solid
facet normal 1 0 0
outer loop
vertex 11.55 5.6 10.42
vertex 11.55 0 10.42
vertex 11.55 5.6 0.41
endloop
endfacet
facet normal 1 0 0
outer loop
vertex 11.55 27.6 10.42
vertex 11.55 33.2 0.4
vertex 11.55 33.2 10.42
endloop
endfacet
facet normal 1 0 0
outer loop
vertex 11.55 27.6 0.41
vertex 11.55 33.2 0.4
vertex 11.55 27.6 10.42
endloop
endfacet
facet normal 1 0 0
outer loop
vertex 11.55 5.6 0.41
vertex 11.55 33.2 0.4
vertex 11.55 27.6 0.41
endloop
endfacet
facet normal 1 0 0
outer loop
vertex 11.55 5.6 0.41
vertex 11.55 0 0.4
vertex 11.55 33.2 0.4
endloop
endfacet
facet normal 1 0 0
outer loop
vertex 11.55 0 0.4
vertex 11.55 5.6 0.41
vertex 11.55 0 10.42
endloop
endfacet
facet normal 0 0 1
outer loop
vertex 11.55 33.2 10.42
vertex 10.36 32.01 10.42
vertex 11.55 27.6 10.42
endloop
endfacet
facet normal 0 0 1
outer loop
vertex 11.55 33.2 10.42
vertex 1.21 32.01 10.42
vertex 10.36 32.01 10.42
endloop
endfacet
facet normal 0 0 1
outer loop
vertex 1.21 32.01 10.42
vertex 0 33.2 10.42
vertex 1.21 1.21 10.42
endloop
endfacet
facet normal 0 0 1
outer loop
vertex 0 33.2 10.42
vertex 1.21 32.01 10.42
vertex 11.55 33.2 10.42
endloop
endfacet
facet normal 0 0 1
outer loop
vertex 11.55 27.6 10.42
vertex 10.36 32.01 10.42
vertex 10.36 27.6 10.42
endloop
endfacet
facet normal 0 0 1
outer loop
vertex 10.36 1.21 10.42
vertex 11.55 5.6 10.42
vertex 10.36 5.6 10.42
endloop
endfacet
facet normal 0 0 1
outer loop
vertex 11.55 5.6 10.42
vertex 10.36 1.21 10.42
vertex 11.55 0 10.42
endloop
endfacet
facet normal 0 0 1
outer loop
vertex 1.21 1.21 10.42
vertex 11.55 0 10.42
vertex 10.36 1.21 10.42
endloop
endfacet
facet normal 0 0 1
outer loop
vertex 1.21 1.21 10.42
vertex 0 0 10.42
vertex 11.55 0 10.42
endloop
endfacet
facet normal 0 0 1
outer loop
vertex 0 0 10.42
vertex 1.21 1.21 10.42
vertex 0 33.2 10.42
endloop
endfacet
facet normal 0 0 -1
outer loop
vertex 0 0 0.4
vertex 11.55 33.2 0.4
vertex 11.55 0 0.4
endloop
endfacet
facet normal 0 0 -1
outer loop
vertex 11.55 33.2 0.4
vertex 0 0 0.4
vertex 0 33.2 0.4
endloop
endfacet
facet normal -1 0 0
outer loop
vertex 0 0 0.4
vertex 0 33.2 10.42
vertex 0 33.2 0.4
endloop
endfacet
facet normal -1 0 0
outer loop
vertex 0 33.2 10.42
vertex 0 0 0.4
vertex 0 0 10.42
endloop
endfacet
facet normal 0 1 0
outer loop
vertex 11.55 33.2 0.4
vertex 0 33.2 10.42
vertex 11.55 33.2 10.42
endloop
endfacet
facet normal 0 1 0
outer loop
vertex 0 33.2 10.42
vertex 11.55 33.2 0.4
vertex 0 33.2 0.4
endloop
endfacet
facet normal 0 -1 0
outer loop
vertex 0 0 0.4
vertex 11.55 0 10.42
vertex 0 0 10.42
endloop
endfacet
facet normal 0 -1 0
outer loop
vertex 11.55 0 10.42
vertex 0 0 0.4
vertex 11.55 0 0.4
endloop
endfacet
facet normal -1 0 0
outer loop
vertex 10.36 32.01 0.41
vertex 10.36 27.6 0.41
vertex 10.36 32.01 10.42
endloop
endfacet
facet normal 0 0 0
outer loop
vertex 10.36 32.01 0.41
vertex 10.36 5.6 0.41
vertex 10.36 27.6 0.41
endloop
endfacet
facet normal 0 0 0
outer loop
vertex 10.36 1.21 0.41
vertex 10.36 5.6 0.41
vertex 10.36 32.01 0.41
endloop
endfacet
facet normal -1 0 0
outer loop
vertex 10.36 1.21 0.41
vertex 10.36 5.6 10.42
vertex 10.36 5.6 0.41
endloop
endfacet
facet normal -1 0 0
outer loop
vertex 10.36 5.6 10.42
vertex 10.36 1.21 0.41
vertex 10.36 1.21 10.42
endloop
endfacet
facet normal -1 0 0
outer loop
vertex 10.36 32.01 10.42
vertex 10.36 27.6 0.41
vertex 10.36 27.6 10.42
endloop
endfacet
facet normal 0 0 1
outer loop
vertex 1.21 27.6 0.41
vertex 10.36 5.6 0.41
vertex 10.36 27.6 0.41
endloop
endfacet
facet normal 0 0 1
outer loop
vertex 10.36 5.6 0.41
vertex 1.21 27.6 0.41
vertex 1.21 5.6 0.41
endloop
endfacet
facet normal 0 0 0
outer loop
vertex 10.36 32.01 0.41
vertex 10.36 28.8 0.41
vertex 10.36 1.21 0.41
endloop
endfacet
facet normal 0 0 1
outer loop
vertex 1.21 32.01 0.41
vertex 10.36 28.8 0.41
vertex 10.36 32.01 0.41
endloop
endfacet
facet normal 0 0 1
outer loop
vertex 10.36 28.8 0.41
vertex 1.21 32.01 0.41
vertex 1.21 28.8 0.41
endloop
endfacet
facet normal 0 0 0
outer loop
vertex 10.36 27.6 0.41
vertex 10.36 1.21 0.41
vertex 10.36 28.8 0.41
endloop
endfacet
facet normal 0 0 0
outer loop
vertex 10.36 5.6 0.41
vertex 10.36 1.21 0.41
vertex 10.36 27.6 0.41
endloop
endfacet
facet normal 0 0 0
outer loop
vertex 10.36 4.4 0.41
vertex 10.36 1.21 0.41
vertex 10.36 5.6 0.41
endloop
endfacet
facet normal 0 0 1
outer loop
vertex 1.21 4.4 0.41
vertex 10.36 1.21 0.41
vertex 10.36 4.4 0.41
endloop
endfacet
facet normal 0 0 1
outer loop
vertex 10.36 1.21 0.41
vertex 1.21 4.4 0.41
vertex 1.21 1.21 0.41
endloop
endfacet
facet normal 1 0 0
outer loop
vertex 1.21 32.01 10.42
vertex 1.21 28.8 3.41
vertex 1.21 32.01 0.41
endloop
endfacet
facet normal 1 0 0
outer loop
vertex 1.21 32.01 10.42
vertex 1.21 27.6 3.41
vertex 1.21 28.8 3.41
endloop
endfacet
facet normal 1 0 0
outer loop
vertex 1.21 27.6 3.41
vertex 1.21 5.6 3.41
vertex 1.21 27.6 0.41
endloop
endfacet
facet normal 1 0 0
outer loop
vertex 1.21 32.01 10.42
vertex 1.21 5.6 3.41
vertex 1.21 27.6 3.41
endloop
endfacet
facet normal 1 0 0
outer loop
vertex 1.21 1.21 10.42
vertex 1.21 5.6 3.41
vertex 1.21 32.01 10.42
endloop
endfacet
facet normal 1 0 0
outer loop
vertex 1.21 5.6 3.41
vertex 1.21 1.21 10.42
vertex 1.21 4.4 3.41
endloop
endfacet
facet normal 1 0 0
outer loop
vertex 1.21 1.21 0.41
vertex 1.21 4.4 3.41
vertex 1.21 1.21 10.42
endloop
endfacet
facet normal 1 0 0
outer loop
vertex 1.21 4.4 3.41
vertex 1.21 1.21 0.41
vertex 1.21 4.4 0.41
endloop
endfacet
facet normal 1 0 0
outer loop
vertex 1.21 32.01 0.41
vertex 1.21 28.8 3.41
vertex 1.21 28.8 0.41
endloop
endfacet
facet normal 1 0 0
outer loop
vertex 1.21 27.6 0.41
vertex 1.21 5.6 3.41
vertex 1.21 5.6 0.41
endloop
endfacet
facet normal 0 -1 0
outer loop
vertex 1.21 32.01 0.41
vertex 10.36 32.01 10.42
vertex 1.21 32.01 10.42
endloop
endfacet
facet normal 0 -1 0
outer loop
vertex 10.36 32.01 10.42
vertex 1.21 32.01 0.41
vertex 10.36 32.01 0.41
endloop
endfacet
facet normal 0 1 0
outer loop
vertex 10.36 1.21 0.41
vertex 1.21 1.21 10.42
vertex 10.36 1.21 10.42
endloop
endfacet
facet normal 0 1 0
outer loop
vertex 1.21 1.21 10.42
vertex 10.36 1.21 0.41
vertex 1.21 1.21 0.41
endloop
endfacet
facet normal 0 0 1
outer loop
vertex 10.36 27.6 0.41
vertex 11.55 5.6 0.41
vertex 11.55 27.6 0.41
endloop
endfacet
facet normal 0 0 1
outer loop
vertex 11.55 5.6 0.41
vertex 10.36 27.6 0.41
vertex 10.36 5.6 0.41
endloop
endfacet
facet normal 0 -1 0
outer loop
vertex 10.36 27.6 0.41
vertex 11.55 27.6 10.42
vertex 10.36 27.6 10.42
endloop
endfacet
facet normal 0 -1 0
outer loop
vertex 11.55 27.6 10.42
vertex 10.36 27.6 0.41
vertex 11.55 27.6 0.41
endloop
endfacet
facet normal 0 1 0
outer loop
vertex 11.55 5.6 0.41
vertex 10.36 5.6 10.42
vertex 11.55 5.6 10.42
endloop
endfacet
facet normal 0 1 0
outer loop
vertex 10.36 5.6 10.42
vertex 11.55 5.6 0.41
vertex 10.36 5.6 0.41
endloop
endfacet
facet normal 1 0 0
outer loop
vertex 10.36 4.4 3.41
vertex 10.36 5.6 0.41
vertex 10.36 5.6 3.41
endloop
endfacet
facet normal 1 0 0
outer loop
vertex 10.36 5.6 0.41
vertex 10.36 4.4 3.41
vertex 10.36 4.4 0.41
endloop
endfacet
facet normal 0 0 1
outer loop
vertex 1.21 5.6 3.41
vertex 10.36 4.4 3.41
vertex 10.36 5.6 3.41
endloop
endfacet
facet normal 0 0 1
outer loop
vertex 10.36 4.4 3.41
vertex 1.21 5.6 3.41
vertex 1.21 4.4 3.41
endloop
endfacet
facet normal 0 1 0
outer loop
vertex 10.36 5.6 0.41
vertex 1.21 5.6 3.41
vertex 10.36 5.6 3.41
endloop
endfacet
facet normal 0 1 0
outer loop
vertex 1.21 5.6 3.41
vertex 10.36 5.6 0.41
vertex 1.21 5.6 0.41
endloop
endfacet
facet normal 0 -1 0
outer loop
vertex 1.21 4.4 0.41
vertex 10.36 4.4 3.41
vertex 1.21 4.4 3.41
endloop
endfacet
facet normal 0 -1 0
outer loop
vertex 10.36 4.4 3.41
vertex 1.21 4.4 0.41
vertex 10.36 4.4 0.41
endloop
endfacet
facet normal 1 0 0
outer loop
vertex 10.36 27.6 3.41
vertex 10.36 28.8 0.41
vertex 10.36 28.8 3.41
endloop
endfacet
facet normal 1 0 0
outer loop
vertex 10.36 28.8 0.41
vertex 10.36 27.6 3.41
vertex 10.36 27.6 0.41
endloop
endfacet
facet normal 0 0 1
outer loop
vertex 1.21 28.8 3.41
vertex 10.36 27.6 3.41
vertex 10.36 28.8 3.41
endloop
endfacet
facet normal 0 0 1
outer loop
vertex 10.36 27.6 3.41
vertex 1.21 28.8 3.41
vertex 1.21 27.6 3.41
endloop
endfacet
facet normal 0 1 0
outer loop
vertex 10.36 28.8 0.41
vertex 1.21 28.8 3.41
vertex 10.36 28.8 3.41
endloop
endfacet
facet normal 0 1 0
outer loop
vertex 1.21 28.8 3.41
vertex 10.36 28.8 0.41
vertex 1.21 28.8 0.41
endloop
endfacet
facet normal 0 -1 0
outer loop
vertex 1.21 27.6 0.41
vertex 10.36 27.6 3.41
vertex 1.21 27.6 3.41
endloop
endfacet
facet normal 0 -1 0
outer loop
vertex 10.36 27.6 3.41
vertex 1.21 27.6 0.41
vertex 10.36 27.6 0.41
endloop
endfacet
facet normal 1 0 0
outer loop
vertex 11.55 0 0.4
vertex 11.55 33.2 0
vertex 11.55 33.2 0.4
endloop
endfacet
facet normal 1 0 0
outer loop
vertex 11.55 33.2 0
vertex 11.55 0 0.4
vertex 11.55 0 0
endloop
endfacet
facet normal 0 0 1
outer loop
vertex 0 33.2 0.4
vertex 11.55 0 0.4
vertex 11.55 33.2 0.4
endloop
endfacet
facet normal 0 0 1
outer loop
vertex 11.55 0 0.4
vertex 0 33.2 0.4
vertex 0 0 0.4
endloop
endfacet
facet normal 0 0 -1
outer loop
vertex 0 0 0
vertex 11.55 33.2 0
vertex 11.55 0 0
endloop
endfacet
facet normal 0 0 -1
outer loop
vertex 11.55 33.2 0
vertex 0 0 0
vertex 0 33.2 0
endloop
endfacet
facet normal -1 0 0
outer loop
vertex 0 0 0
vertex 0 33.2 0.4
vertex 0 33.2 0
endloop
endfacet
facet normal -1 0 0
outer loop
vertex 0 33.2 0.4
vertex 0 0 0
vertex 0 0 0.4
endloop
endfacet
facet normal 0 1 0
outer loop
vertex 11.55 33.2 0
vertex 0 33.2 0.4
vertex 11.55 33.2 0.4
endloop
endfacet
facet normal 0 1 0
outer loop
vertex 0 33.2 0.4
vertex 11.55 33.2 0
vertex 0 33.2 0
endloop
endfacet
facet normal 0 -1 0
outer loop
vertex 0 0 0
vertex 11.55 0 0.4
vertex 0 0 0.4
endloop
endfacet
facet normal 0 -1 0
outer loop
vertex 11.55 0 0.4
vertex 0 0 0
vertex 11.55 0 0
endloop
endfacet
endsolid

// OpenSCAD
// file: ../../Base/Rotation.scad
// Fischertechnik Box Foundation
// Geometry Helpers Rotation

include <PlacementOptions.scad>

// getRotatedSpace(space, rotation=NoRotation)
// Rotates the space dependent on the specified rotation

function getRotatedSpace(space, rotation=NoRotation) = [
    (rotation == Rotate90 || rotation == Rotate270) ? space.y : space.x,
    (rotation == Rotate90 || rotation == Rotate270) ? space.x : space.y
];

// Rotates the given space around the fixed left lower corner
// space = the space the children needs as width/depth list [width,depth]
// rotation = 0 Rotate0 degrees, 1 Rotate90 degrees, 2 Rotate180 degrees, 3 Rotate270 degrees (equivalent to -90)

module RotateFix(space, rotation=NoRotation) {
    dy = (rotation == Rotate0 || rotation == Rotate270) ? 0 :
        (rotation == Rotate90) ? space.x :
        space.y;
    dx = (rotation < Rotate180) ? 0 :
        (rotation == Rotate180) ? space.x :
        space.y;
    
    translate([dx, dy, 0])
        rotate([0, 0, rotations[rotation]])
            children();
}
// file: ../../Base/Alignment.scad
// Fischertechnik Box Foundation
// Geometry Helpers Alignment

include <PlacementOptions.scad>

// getAlignedX(elementWidth, spaceWidth, align=AlignRight, offset=0)
// Gets the aligned X offset of an element with the given
// width in the given space.
// elementWidth = The width of the element to positon
// spaceWidth = The space where the element should be aligned
// align = 0 AlignLeft, 1 AlignCenter, 2 AlignRight
// offset = an optional offset from the aligned position. When
// aligned left or centered, then positive values are in X direction.
// When aligned right then positive values are in negative X direction.

function getAlignedX(elementWidth, spaceWidth, align=AlignRight, offset=0) =
    (align == AlignLeft) ?
        offset :
        ((align == AlignCenter) ?
        (spaceWidth - elementWidth)/2 + offset :
        spaceWidth - offset - elementWidth);

// getAlignedY(elementDepth, spaceDepth, align=AlignTop, offset=0)
// Gets the aligned Y offset of an element with the given
// depth in the given space.
// elementDepth = The depth of the element to positon
// spaceDepth = The space where the element should be aligned
// align = 0 AlignBottom, 1 AlignCenter, 2 AlignTop
// offset = an optional offset from the aligned position. When
// aligned bottom or centered, then positive values are in Y direction.
// When aligned top then positive values are in negative Y direction.

function getAlignedY(elementDepth, spaceDepth, align=AlignTop, offset=0) =
    (align == AlignBottom) ?
        offset :
        ((align == AlignCenter) ?
        (spaceDepth - elementDepth)/2 + offset :
        spaceDepth - offset - elementDepth);
// file: ../../Base/PlacementOptions.scad
// Fischertechnik Box Foundation
// Placement Options

// Alignment
NoAlign = 0;
AlignLeft = 1;
AlignBottom = 2;
AlignCenter = 3;
AlignRight = 4;
AlignTop = 5;

// Element rotation degree steps
rotations = [0, -90, -180, -270];

// Rotation
NoRotation = 0;
Rotate0 = 0;
Rotate90 = 1;
Rotate180 = 2;
Rotate270 = 3;

// Docking (seen from above)
NoDock = -1;
DockLeft = 0;
DockTop = 1;
DockRight = 2;
DockCorner = 2;
DockBottom = 3;

// Web corners
LowerLeft = 0;
UpperLeft = 1;
UpperRight = 2;
LowerRight = 3;

// Web position relative to corner
LeftOfCorner = 0;
RightOfCorner = 1;
// file: ../../Base/Boxes.scad
// Fischertechnik Box Foundation
// Pre-designed Boxes

use <Constants.scad>

include <PlacementOptions.scad>

box190Width = 190;
box190Depth = 130;
box130Width = 130;
box130Depth = 95;

// Values are from an original ec3 box
topBottomDifference = 1.5;
outerHeight = 40;
innerHeight = 38.2;
baseThickness = outerHeight - innerHeight;
stackExcess = 5.7;
radius = 3.5;
wallThickness = 1.5;
tolerance = 0.2;
stackOffset = innerHeight - stackExcess;

boxUsageHeight = stackOffset;
boxWallThickness = wallThickness;
boxBaseThickness = baseThickness;
boxWebWidth = 3.0;

// getBoxWallThickness()
// Gets the wall thickness of a Fischertechnik Box
function getBoxWallThickness() = boxWallThickness;

// getBoxUsageHeight()
// Gets the usable height of a Fischertechnik box
function getBoxUsageHeight() = boxUsageHeight;

// getBoxInnerHeight()
// Gets the inner height of a Fischertechnik box, including the stack excess
function getBoxInnerHeight() = innerHeight;

// getBoxBaseThickness()
// Gets the thickness of the Fischertechnik box base.
function getBoxBaseThickness() = boxBaseThickness;

// getBoxWebWidth()
// Gets the width of a box web
function getBoxWebWidth() = boxWebWidth;

// getBox190Space()
// Gets the usable inner space of a Box 190 as an x/y-list
function getBox190Space() = [
    box190Width - 2*getBoxWallThickness() - topBottomDifference, 
    box190Depth - 2*getBoxWallThickness() - topBottomDifference ];

// BoxBase(width, depth)
// Creates an empty stackable Fischertechnik compatible box
// width = Outer width of the box (190, 130, ...)
// depth = Outer depth of the box (130, 95, ...)

module BoxBase(width, depth, height=outerHeight) {    
    thinPlate = 0.01;

    innerHeight = height - baseThickness;    
    
    module BodyPlate(width, depth) {
        translate([radius, radius])
        hull() {
            w = width-2*radius;
            d = depth-2*radius;
            cube([w, d, thinPlate]);
            cylinder(thinPlate, r=radius, $fn=getFragments());
            translate([w, 0])
                cylinder(thinPlate, r=radius, $fn=getFragments());
            translate([w, d])
                cylinder(thinPlate, r=radius, $fn=getFragments());
            translate([0, d])
                cylinder(thinPlate, r=radius, $fn=getFragments());
        }
    }
    
    module Body(tolerance=tolerance) {
        hull() {
            // Bottom with tolerance to fit into the original boxes when stacked
            translate([-wallThickness+tolerance, -wallThickness+tolerance, -baseThickness])
                BodyPlate(width-topBottomDifference-2*tolerance, depth-topBottomDifference-2*tolerance);
            
            // Top
            translate([-wallThickness-topBottomDifference/2, -wallThickness-topBottomDifference/2, innerHeight-thinPlate])
                BodyPlate(width, depth);
         }
    }

    module Cutoff() {
        hull() {
            coWidth = width - 2*wallThickness;
            coDepth = depth - 2*wallThickness;
            
            // Bottom
            BodyPlate(coWidth-topBottomDifference, coDepth-topBottomDifference);

            // Top
            translate([-topBottomDifference/2, -topBottomDifference/2, innerHeight+thinPlate]) 
                BodyPlate(coWidth, coDepth);
        }
    }
    
    difference() {        
        Body();
        Cutoff();
        stackOffset = innerHeight - stackExcess;
        translate([0, 0, stackOffset + baseThickness])
            Body(tolerance=0);
    }
}

// Creates the Fischertechnik empty box 130x190 mm and places it at position 0,0
// 190x130 are the outer sizes, the inner space is slightly smaller. Use getBox190Space() to get the inner sizes.
// The box is positioned that the usable inner space is at the 0,0,0 position. The

module Box190() {
    BoxBase(box190Width, box190Depth);
}

// Gets the usable inner space of a Box 130 as an x/y-list
function getBox130Space() = [
    box130Width - 2*getBoxWallThickness() - topBottomDifference, 
    box130Depth - 2*getBoxWallThickness() - topBottomDifference ];

// Creates the Fischertechnik empty box 95x130 mm and places it at position 0,0
// 190x130 are the outer sizes, the inner space is slightly smaller. Use getBox190Space() to get the inner sizes.
// The box is positioned that the usable inner space is at the 0,0,0 position. The

module Box130() {
    BoxBase(box130Width, box130Depth);
}

// Creates a web at the specified box walls
// corner 0 = LowerLeft, 1 = UpperLeft, 2 = UpperRight, 3 = LowerRight
// side 0 = LeftOfCorner, 1 = RightOfCorner
// distance = Distance in mm from the corner
// boxSpace = inner width and depth of the box (default: Box 190)
// webWidth = length of the web (default is 3 mms)
// webThickness = thickness of the web (default is 1 mm)

module BoxWeb(corner, side, distance, boxSpace=getBox190Space(), webWidth=getBoxWebWidth(), webThickness=1.0) {
    sink = getBoxWallThickness()/2;

    width = (corner % 2 == 0) ? 
            (side == LeftOfCorner ? webWidth : webThickness) :
            (side == LeftOfCorner ? webThickness : webWidth);

    depth = (corner % 2 == 0) ? 
            (side == RightOfCorner ? webWidth : webThickness) :
            (side == RightOfCorner ? webThickness : webWidth);
    
    xDiff = corner == LowerLeft ? 
                (side == LeftOfCorner ? -sink : distance) :
            (corner == UpperLeft ?                
                (side == LeftOfCorner ? distance : -sink) :
            (corner == UpperRight ?
                (side == LeftOfCorner ? boxSpace.x-webWidth+sink : boxSpace.x-distance-webThickness) :
                (side == LeftOfCorner ? boxSpace.x-distance-webThickness: boxSpace.x-webWidth+sink)));

    yDiff = corner == LowerLeft ? 
                (side == RightOfCorner ? -sink : distance) :
            (corner == UpperLeft ?
                (side == RightOfCorner ? boxSpace.y-distance : boxSpace.y-webWidth+sink) :
            (corner == UpperRight ?
                (side == RightOfCorner ? boxSpace.y-webWidth+sink : boxSpace.y-distance) :
                (side == RightOfCorner ? distance : -sink)));
    
    translate([xDiff, yDiff, -getExcess()])
        cube([width, depth, boxUsageHeight + 2*getExcess()]);
}
// file: ../../Base/Placement.scad
// Fischertechnik Box Foundation
// Geometry Helpers Placement

use <Constants.scad>
use <Alignment.scad>
use <Rotation.scad>
use <Boxes.scad>

include <PlacementOptions.scad>

// Place(x=0, y=0, elementSpace=[0,0], alignX=AlignLeft, alignY=AlignBottom, rotation=Rotate0, boxSpace=getBox190Space())
// Places the child at the specified position
// y = Y-Position. This is a relative position when an X aligment is specified.
// x = X-Position. This is a relative position when an Y aligment is specified.
// elementSpace = space of the element to be placed [x,y]
// alignX = -1=NoAlign, 0 AlignLeft, 1 AlignCenter, 3 AlignRight (elementSpace and boxSpace required!)
// alignY = -1=NoAlign, 2 AlignBottom, 1 AlignCenter, 4 AlignTop (elementSpace and boxSpace required!)
// rotation = 0 Rotate0 0 degrees, 1 Rotate90 90 degrees, 
// 2 Rotate180 180 degrees, 3 Rotate270 270 degrees (equivalent to -90)
// boxSpace = Inner space of the box where the placement occurs [x,y] - default is Box 190x130 inner space

module Place(x=0, y=0, elementSpace=[0,0], 
  alignX=AlignLeft, alignY=AlignBottom, 
  rotation=NoRotation, boxSpace=getBox190Space()) {

    module Position(x, y, space, rotation=Rotate0) {
        translate([x, y, 0])
            RotateFix(space, rotation)
                children();
    }

    space = getRotatedSpace(elementSpace, rotation);
    alignedX = getAlignedX(space.x, boxSpace.x, alignX, x);
    alignedY = getAlignedY(space.y, boxSpace.y, alignY, y);
    Position(alignedX, alignedY, elementSpace, rotation)
        children();
}

// Center(space=getBox130Space(), elementSpace=[0,0])
// space = Space where the children is centered. For cylinder use centered=true and no elementSpace.
// elementSpace = space of the element to be centered [x,y]

module Center(space=getBox190Space(), elementSpace=[0,0]) {
    Place(elementSpace=elementSpace, boxSpace=space, alignX=AlignCenter, alignY=AlignCenter)
        children();
}

// CenterHorizontal(width=0, y=0, offset=0, space=getBox130Space())
// width = Width of the element to be placed.
// y = Y position of the element
// offset = Offset from the center position (negative will be left of the center)
// space = Space where the element is placed

module CenterHorizontal(width=0, y=0, offset=0, space=getBox190Space()) {
    Place(x=offset, y=y, elementSpace=[width, 0], boxSpace=space, alignX=AlignCenter)
        children(0);
}

// CenterVertical(depth=0, x=0, offset=0, space=getBox130Space())
// depth = Depth of the element to be placed.
// x = X position of the element
// offset = Offset from the center position (negative will be down of the center)
// space = Space where the element is placed

module CenterVertical(depth=0, x=0, offset=0, space=getBox190Space()) {
    Place(x=x, y=offset, elementSpace=[0, depth], boxSpace=space, alignY=AlignCenter)
        children(0);
}

// getIsVertical(align)
// True if the specified alignment needs a vertical orientation for a divider (AlignRight, AlignLeft)

function getIsVertical(align) = (align == AlignRight || align == AlignLeft);

// getIsHorizontal(align)
// True if the specified alignment needs a horizontal orientation for a divider (AlignTop, AlignBottom)

function getIsHorizontal(align) = (align == AlignTop || align == AlignBottom);
// file: ../../Elements/AxisClip10.scad
// Fischertechnik Box Library
// Axis for clip 10
// 31023

use <../ModelBase/Simple.scad>
use <../Base/Constants.scad>

width = 12;
depth = 12;
height = 23;
upperDiameter = 3.6;
clipHeight = 10;

// getAxisClip10Space()
// Gets the space of a frame for a clip 10 with spring ring (mot2)

function getAxisClip10Space() = [width, depth, height];

// AxisClip10(height, clipHeight)
// Axis for clip 10 with spring ring (mot2)
// height = Height of the complete axis
// clipHeight = Height of the rt for the clip (standard is 10, in mot3 its only 7)

module AxisClip10(height=height, clipHeight=clipHeight) {
    LeveledAxisWithSpace(height, height-clipHeight, getAxisClip10Space(), diameter=upperDiameter);
}

// Tests
color("lightgray")
AxisClip10();
// file: ../../Base/Constants.scad
// Fischertechnik Box Foundation
// Constants

// Constant values necessary for multiple elements

// Base constants
dividerThickness = 1.2;
excess = 0.01;
fragments = 90;
tolerance = 0.8;

// Gets the thickness of a divider 
function getDividerThickness() = dividerThickness;

// Gets the excess that is used to merge walls into each other
function getExcess() = excess;

// Gets amount of fragments of a cylinder
function getFragments() = fragments;

// Gets the inner tolerance of a frame to each side
function getTolerance() = tolerance;


// Fischertechnik specific constants
axisDiameter = 4;
axisBottomDiameter = axisDiameter + 1;
standardEdgeDistance = 2.5;
standardWebDistance = 11.5;
standardCornerLength = 15;
tubeWallFactor = 0.8;
smallPartsFrameHeight = 20;

// Gets axis diameter
function getAxisDiameter() = axisDiameter;

// Gets axis bottom diameter for thicker part at the bottom
function getAxisBottomDiameter() = axisBottomDiameter;

// gets the standard distance to the wall of the box for dockable frames with webs
function getStandardEdgeDistance() = standardEdgeDistance;

// gets the standard distance of each web to the corner of the dockable frame
function getStandardWebDistance() = standardWebDistance;

// gets the standard length of the corner walls of a dockable frame
function getStandardCornerLength() = standardCornerLength;

// gets the wall thickness of a tube.
function getTubeWallThickness() = tubeWallFactor * getDividerThickness();

// gets the frame height for docked small parts boxes.
function getSmallPartsFrameHeight() = smallPartsFrameHeight;
// file: ../../Elements/FrameCouplingBracket.scad
// Fischertechnik Box Library
// Coupling Bracket
// 38252

use <../Base/Constants.scad>
use <../ModelBase/Simple.scad>
use <../ModelBase/Complex.scad>

width = 9.15 - getTolerance();
depth = 30;
height = 10;

// getFrameCouplingBracketSpace()
// Gets the space the frame coupling bracket needs as width and depth (.x and .y as a list)

function getFrameCouplingBracketSpace() = getFrameOuterVolume([width, depth, height]);

// FrameCouplingBracket()
// Coupling Bracket
// 38252

module FrameCouplingBracket() {
    cutOffWidth = 2 * getDividerThickness();
    cutOffDepth = 22;
    cutOffHeight = height + 2*getExcess();
    
    innerVolume = getFrameInnerVolume([width, depth, height]);
    cutOffXOffset = innerVolume.x + 2*getExcess();
    cutoffYOffset = (innerVolume.y - cutOffDepth) / 2 + getDividerThickness();
    
    difference() {
        Frame(innerVolume, tolerance=0);
        translate([cutOffXOffset, cutoffYOffset, 0])
            cube([cutOffWidth, cutOffDepth, cutOffHeight]);
    }
    
    railWidth = innerVolume.x + 2*getExcess();
    railDepth = getDividerThickness();
    railHeight = 3 + getExcess();
    
    railXOffset = getDividerThickness() - getExcess();
    railYOffset1 = cutoffYOffset - getDividerThickness();
    railYOffset2 = cutoffYOffset + cutOffDepth;
    
    translate([railXOffset, 0, -getExcess()]) {
        translate([0, railYOffset1])
            cube([railWidth, railDepth, railHeight]);
        translate([0, railYOffset2])
            cube([railWidth, railDepth, railHeight]);
    }
}

// Test
color("lightgray")
FrameCouplingBracket();
// file: ../TestPrint.scad
// 3D Print Test Base

use <../Base/Constants.scad>

use <../Elements/AxisClip10.scad>

module TestPrint(elementSpace) {
    cube([elementSpace.x, elementSpace.y, 0.4]);
    translate([0,0,0.4+getExcess()]) {
        children();
    }
}

TestPrint(getAxisClip10Space())
    AxisClip10();
// main file
// 3D Print Test
// FrameCouplingBracket

use <../TestPrint.scad>
use <../../Elements/FrameCouplingBracket.scad>

TestPrint(getFrameCouplingBracketSpace())
    FrameCouplingBracket();
